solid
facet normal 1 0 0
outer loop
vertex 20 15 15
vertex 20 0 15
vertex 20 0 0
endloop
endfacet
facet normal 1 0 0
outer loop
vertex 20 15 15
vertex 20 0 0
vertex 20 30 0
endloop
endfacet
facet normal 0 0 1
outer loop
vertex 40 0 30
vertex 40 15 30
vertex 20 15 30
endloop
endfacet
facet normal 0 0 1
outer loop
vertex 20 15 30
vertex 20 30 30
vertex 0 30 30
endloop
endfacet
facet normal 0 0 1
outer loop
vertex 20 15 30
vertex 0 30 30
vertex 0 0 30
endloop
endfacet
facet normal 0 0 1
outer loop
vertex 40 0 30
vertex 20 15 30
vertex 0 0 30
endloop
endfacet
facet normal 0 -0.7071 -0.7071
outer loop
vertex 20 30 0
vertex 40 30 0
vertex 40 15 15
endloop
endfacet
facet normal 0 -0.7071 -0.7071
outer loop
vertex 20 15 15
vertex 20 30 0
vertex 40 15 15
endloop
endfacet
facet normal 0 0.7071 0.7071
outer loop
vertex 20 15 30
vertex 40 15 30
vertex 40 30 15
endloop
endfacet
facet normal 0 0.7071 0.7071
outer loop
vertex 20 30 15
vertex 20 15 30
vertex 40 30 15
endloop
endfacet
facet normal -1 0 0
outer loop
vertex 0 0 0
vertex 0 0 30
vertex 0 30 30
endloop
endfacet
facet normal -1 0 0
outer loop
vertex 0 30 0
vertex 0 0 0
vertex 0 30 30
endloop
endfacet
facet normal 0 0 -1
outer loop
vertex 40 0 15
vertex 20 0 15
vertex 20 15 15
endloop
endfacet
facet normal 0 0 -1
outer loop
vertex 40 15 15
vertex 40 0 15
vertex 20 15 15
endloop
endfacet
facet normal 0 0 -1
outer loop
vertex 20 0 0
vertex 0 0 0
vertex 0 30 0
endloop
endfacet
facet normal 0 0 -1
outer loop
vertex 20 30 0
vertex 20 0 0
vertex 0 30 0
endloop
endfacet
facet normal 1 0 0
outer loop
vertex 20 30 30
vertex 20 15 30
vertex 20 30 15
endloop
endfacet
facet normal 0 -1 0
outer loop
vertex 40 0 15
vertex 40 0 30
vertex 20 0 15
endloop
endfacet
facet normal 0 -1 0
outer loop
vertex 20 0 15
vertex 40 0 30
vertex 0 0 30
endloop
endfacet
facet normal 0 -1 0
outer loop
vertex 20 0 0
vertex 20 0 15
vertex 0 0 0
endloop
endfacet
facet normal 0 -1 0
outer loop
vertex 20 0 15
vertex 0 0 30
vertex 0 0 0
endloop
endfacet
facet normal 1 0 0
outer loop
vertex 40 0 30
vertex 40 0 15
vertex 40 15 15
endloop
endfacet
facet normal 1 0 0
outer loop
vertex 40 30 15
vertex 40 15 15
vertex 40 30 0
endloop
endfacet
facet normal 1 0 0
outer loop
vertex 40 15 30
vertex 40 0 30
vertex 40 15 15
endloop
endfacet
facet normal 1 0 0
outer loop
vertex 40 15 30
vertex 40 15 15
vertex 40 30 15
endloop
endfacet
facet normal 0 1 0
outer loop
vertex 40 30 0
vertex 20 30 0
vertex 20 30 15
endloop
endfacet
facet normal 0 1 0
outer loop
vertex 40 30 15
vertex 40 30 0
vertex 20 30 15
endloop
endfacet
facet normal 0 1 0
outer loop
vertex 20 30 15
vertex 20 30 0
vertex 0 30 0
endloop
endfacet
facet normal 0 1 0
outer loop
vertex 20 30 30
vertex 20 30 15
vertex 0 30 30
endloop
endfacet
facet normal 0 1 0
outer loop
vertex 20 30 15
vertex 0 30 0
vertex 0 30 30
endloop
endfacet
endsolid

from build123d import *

# Parameters (mm, degrees)
F0_W     = 15
F0_H     = 15
F1_DEPTH = 20
F2_DEPTH = 40
F4_DEPTH = 20
F6_DEPTH = 20


with BuildPart() as f1:
    # F0 (on Right) → F1 (new body)
    with BuildSketch(Plane.YZ):
        with Locations((7.5, 7.5)):
            Rectangle(F0_W, F0_H)
        with Locations((22.5, 7.5)):
            Rectangle(F0_W, F0_H)
        with Locations((7.5, 22.5)):
            Rectangle(F0_W, F0_H)
        with Locations((22.5, 22.5)):
            Rectangle(F0_W, F0_H)
    extrude(amount=F1_DEPTH)

    # F0 (on Right) → F2 (join)
    with BuildSketch(Plane.YZ):
        with Locations((22.5, 7.5)):
            Rectangle(F0_W, F0_H)
        with Locations((22.5, 22.5)):
            Rectangle(F0_W, F0_H)
        with Locations((7.5, 22.5)):
            Rectangle(F0_W, F0_H)
    extrude(amount=F2_DEPTH)

    # F3 (on face) → F4 (cut)
    with BuildSketch(Plane.YZ.offset(40)):
        Polygon((30, 30), (15, 30), (30, 15), align=None)
    extrude(amount=-F4_DEPTH, mode=Mode.SUBTRACT)

    # F5 (on face) → F6 (cut)
    with BuildSketch(Plane.YZ.offset(40)):
        Polygon((30, 0), (15, 15), (15, 0), align=None)
    extrude(amount=-F6_DEPTH, mode=Mode.SUBTRACT)


solid = f1.part
